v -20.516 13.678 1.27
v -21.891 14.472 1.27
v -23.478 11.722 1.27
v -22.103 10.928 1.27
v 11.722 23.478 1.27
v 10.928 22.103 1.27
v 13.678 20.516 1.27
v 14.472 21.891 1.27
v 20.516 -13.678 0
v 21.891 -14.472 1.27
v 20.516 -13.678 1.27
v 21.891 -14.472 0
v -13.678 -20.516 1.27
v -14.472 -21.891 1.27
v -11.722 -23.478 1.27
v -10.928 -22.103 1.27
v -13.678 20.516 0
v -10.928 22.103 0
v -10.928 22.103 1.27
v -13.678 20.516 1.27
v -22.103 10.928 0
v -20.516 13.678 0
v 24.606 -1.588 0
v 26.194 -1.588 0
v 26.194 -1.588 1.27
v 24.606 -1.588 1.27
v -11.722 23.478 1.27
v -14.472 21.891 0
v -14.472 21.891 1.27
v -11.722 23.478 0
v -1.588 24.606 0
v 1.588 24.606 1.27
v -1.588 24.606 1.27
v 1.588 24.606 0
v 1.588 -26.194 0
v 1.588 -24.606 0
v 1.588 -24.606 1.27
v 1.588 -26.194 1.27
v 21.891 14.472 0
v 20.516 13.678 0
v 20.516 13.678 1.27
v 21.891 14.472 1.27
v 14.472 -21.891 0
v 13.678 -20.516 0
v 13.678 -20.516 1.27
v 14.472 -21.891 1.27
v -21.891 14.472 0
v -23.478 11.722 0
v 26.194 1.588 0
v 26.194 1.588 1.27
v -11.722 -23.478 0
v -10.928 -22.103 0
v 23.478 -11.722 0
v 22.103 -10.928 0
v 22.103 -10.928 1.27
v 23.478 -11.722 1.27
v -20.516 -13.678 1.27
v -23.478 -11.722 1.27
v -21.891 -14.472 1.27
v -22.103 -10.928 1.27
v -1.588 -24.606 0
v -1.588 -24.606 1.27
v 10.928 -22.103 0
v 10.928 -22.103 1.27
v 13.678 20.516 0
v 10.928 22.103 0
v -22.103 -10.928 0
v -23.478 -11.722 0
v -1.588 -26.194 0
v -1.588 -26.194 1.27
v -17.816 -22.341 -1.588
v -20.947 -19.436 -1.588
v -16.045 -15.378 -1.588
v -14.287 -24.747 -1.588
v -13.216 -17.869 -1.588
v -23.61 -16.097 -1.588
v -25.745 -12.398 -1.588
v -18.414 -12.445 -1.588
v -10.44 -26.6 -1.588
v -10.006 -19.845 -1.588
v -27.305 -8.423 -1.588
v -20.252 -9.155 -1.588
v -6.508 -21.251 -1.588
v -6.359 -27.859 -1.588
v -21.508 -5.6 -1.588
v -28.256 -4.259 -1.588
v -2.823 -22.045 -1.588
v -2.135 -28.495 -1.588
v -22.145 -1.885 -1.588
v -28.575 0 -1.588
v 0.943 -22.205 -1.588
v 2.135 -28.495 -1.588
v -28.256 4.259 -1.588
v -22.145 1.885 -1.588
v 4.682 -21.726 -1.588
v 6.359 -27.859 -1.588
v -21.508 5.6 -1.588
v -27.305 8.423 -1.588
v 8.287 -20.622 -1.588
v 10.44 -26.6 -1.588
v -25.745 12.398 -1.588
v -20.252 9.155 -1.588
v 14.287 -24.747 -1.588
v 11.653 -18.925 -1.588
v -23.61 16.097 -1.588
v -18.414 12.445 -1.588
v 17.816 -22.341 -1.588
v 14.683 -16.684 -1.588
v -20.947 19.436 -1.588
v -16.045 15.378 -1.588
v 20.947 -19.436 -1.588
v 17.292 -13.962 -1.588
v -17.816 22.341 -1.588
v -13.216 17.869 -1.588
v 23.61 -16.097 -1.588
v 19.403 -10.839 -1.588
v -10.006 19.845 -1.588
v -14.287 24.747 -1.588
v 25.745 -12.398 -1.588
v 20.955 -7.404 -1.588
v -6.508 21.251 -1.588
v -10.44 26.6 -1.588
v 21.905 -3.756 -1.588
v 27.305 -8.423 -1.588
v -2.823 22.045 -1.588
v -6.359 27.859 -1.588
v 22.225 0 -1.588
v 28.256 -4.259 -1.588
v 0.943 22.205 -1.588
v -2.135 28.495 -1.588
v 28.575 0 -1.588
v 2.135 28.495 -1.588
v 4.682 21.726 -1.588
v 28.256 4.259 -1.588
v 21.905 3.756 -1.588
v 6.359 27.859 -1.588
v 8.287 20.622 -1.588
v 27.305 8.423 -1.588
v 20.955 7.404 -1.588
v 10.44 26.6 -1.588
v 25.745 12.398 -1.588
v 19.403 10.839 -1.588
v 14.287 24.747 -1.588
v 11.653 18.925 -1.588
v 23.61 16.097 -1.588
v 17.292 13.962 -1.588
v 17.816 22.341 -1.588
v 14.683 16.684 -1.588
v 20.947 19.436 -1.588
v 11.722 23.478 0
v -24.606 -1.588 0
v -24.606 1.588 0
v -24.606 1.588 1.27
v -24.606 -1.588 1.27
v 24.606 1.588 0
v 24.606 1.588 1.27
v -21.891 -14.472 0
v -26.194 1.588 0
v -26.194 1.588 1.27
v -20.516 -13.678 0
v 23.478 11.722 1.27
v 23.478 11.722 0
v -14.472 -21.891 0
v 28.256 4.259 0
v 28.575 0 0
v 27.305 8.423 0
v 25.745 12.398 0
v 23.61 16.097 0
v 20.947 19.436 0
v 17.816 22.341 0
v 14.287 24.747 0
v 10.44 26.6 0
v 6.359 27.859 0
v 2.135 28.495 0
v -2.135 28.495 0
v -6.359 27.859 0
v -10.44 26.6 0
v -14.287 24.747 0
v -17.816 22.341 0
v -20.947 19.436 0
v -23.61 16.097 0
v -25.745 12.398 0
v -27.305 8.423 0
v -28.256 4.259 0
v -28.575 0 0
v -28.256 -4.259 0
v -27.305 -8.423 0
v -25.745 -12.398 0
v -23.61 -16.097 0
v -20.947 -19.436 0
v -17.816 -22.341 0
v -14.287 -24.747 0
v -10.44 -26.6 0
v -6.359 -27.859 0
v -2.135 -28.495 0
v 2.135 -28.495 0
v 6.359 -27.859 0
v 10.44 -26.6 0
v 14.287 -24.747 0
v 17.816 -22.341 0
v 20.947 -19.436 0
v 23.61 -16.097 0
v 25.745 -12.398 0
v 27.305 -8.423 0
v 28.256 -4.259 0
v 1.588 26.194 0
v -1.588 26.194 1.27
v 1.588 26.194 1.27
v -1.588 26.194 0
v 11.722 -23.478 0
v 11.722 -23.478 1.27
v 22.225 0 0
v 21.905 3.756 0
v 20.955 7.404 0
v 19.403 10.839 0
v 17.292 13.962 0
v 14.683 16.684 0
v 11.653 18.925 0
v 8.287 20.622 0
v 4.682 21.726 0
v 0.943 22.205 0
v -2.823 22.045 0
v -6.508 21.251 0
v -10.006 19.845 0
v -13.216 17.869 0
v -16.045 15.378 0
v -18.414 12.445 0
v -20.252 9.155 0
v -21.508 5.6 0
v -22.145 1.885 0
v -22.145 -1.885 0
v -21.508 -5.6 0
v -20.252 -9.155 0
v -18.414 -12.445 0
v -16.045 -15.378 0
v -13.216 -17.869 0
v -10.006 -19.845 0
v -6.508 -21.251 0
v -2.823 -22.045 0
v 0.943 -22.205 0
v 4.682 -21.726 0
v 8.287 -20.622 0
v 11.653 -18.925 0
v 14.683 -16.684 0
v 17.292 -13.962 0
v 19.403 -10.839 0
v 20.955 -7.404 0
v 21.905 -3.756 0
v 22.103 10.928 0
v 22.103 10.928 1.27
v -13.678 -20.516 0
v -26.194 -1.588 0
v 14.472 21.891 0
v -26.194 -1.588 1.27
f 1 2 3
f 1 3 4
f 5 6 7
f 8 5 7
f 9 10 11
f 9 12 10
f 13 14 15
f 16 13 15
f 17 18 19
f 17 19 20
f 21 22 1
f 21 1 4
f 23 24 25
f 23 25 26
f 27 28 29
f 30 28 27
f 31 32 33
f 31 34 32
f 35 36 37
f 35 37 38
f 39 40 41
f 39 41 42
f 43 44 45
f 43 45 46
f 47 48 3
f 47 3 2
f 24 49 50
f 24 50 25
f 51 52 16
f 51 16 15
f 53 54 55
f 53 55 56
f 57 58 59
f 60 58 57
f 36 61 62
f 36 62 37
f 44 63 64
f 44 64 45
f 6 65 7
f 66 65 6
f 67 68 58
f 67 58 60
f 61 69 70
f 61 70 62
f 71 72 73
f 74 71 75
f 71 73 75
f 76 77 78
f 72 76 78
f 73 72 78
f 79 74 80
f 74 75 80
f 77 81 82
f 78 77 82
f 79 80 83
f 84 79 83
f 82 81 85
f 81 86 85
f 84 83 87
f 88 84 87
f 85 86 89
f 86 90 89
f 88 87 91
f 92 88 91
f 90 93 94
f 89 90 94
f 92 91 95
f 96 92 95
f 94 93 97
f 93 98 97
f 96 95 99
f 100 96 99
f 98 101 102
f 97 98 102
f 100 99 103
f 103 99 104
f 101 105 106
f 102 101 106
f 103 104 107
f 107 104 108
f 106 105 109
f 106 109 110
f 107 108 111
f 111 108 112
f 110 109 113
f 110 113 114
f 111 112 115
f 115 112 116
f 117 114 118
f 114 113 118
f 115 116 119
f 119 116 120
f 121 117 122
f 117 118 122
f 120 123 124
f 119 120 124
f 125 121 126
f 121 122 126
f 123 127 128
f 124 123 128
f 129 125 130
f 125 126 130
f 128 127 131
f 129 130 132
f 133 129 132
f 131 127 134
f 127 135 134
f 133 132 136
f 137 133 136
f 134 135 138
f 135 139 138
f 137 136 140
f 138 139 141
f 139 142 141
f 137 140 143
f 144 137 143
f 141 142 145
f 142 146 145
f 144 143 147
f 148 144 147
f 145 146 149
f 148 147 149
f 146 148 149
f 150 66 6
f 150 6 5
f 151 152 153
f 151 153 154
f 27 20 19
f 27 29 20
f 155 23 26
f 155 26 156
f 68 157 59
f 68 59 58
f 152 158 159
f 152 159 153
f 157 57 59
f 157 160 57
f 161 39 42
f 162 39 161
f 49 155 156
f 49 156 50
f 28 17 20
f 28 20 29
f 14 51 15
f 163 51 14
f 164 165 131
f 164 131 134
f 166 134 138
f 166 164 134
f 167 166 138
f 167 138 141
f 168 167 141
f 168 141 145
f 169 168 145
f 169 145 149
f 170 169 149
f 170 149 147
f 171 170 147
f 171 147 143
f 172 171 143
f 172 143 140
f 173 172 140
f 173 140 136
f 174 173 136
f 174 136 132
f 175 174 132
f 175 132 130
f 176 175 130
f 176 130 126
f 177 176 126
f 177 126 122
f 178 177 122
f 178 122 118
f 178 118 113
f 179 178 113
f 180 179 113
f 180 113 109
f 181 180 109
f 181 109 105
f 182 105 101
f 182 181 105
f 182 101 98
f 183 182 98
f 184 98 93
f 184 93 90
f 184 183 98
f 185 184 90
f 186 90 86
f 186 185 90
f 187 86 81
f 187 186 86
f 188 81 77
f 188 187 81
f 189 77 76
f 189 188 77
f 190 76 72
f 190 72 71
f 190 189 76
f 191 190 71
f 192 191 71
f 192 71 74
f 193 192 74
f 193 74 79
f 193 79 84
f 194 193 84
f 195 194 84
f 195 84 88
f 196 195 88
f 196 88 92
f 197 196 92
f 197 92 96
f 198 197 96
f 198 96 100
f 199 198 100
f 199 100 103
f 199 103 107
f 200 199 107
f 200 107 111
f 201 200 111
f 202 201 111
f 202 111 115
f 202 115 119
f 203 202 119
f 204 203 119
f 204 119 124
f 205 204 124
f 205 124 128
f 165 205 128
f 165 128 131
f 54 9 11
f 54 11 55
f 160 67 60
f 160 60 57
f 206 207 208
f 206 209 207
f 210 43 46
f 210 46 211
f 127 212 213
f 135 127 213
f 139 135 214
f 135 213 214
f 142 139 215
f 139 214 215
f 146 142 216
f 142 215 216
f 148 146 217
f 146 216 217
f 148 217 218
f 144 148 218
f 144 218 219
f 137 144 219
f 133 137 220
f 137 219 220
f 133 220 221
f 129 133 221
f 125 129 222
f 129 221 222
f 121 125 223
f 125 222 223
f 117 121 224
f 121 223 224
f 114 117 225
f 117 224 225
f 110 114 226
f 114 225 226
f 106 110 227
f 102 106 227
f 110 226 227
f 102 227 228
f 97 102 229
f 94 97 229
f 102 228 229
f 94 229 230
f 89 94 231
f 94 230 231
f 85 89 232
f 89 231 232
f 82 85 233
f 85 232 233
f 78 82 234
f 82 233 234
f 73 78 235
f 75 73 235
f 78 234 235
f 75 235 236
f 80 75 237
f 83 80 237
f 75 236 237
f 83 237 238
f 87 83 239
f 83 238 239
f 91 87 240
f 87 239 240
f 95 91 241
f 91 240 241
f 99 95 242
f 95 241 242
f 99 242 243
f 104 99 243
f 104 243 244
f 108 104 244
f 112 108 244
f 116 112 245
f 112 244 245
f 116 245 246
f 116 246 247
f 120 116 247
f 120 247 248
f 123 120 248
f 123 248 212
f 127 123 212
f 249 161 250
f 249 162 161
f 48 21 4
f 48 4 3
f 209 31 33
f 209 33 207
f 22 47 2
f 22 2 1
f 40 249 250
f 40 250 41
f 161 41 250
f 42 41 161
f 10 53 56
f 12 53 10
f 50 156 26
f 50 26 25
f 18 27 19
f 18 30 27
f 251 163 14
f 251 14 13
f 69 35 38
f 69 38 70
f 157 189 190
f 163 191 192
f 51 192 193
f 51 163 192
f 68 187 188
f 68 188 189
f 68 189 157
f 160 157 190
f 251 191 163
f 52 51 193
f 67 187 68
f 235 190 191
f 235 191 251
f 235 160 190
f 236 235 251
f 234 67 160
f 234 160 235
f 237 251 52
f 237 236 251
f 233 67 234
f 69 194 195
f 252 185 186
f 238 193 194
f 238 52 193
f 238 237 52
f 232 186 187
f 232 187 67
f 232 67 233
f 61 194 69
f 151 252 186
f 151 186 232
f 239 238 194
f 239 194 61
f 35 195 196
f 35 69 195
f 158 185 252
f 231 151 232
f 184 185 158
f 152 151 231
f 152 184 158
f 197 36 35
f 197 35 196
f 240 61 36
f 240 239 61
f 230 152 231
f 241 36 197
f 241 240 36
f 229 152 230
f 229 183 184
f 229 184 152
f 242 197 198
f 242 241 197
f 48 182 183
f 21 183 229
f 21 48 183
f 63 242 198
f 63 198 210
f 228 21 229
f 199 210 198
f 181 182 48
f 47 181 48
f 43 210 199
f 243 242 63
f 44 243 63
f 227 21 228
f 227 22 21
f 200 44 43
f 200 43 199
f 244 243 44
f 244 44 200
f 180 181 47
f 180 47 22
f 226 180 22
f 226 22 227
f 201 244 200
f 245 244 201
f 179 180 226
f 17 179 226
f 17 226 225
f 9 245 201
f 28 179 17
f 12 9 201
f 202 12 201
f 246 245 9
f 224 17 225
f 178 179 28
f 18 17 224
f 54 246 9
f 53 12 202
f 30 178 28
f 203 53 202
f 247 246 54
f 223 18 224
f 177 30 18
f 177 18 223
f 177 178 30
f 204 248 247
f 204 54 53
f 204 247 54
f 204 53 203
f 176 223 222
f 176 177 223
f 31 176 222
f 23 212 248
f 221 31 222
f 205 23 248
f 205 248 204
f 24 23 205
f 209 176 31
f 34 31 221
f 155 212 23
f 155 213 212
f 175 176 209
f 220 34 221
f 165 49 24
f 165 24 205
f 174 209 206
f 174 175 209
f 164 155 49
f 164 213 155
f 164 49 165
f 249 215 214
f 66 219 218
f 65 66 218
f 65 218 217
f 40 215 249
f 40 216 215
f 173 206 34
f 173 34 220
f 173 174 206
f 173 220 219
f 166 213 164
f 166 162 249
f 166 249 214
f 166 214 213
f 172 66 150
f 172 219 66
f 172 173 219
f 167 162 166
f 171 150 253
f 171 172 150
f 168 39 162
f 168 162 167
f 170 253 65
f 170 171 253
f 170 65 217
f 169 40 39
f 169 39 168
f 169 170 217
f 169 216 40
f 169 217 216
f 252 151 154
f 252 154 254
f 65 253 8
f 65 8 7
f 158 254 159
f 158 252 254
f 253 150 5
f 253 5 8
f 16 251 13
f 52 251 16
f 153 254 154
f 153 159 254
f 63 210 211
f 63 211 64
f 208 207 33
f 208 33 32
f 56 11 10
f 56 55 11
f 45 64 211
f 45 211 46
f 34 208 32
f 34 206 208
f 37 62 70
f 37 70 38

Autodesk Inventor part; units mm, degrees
ref_plane "YZ Plane" through (0, 0, 0) normal (1, 0, 0) x (0, 1, 0)
ref_plane "XZ Plane" through (0, 0, 0) normal (0, 1, 0) x (-1, 0, 0)
ref_plane "XY Plane" through (0, 0, 0) normal (0, 0, 1) x (1, 0, 0)
sketch "Sketch1" plane through (0, 0, 0) normal (0, 0, 1) x (1, 0, 0)
  circle A0 centre (0, 0) radius 22.225
  circle A1 centre (0, 0) radius 28.575
  line L0 (0, 0) -> (-22.225, 0) construction
  line L1 (-26.1937, 1.5875) -> (-24.6062, 1.5875)
  line L2 (-24.6062, 1.5875) -> (-24.6062, -1.5875)
  line L3 (-24.6062, -1.5875) -> (-26.1937, -1.5875)
  line L4 (-26.1937, -1.5875) -> (-26.1937, 1.5875)
  line L5 (-22.225, 0) -> (-28.575, 0) construction
  line L6 (-25.4, 1.5875) -> (-25.4, -1.5875) construction
  line L7 (-23.4782, -11.7221) -> (-22.1034, -10.9283)
  line L8 (-22.1034, -10.9283) -> (-20.5159, -13.6779)
  line L9 (-20.5159, -13.6779) -> (-21.8907, -14.4717)
  line L10 (-21.8907, -14.4717) -> (-23.4782, -11.7221)
  line L11 (-22.7908, -11.3252) -> (-21.2033, -14.0748) construction
  line L12 (-14.4717, -21.8907) -> (-13.6779, -20.5159)
  line L13 (-13.6779, -20.5159) -> (-10.9283, -22.1034)
  line L14 (-10.9283, -22.1034) -> (-11.7221, -23.4782)
  line L15 (-11.7221, -23.4782) -> (-14.4717, -21.8907)
  line L16 (-14.0748, -21.2033) -> (-11.3252, -22.7908) construction
  line L17 (-1.5875, -26.1938) -> (-1.5875, -24.6063)
  line L18 (-1.5875, -24.6063) -> (1.5875, -24.6063)
  line L19 (1.5875, -24.6063) -> (1.5875, -26.1938)
  line L20 (1.5875, -26.1938) -> (-1.5875, -26.1938)
  line L21 (-1.5875, -25.4) -> (1.5875, -25.4) construction
  line L22 (11.7221, -23.4782) -> (10.9283, -22.1034)
  line L23 (10.9283, -22.1034) -> (13.6779, -20.5159)
  line L24 (13.6779, -20.5159) -> (14.4717, -21.8907)
  line L25 (14.4717, -21.8907) -> (11.7221, -23.4782)
  line L26 (11.3252, -22.7908) -> (14.0748, -21.2033) construction
  line L27 (21.8907, -14.4717) -> (20.5159, -13.6779)
  line L28 (20.5159, -13.6779) -> (22.1034, -10.9283)
  line L29 (22.1034, -10.9283) -> (23.4782, -11.7221)
  line L30 (23.4782, -11.7221) -> (21.8907, -14.4717)
  line L31 (21.2033, -14.0748) -> (22.7908, -11.3252) construction
  line L32 (26.1938, -1.5875) -> (24.6063, -1.5875)
  line L33 (24.6063, -1.5875) -> (24.6063, 1.5875)
  line L34 (24.6063, 1.5875) -> (26.1938, 1.5875)
  line L35 (26.1938, 1.5875) -> (26.1938, -1.5875)
  line L36 (25.4, -1.5875) -> (25.4, 1.5875) construction
  line L37 (23.4782, 11.7221) -> (22.1034, 10.9283)
  line L38 (22.1034, 10.9283) -> (20.5159, 13.6779)
  line L39 (20.5159, 13.6779) -> (21.8907, 14.4717)
  line L40 (21.8907, 14.4717) -> (23.4782, 11.7221)
  line L41 (22.7908, 11.3252) -> (21.2033, 14.0748) construction
  line L42 (14.4717, 21.8907) -> (13.6779, 20.5159)
  line L43 (13.6779, 20.5159) -> (10.9283, 22.1034)
  line L44 (10.9283, 22.1034) -> (11.7221, 23.4782)
  line L45 (11.7221, 23.4782) -> (14.4717, 21.8907)
  line L46 (14.0748, 21.2033) -> (11.3252, 22.7908) construction
  line L47 (1.5875, 26.1937) -> (1.5875, 24.6063)
  line L48 (1.5875, 24.6063) -> (-1.5875, 24.6063)
  line L49 (-1.5875, 24.6063) -> (-1.5875, 26.1938)
  line L50 (-1.5875, 26.1938) -> (1.5875, 26.1937)
  line L51 (1.5875, 25.4) -> (-1.5875, 25.4) construction
  line L52 (-11.7221, 23.4782) -> (-10.9283, 22.1034)
  line L53 (-10.9283, 22.1034) -> (-13.6779, 20.5159)
  line L54 (-13.6779, 20.5159) -> (-14.4717, 21.8907)
  line L55 (-14.4717, 21.8907) -> (-11.7221, 23.4782)
  line L56 (-11.3252, 22.7908) -> (-14.0748, 21.2033) construction
  line L57 (-21.8907, 14.4717) -> (-20.5159, 13.6779)
  line L58 (-20.5159, 13.6779) -> (-22.1034, 10.9283)
  line L59 (-22.1034, 10.9283) -> (-23.4782, 11.7221)
  line L60 (-23.4782, 11.7221) -> (-21.8907, 14.4717)
  line L61 (-21.2033, 14.0748) -> (-22.7908, 11.3252) construction
  point P0 (-26.1937, 0)
  point P1 (-25.4, 0)
  point P2 (-22.6845, -13.0969)
  point P3 (-21.997, -12.7)
  point P4 (-13.0969, -22.6845)
  point P5 (-12.7, -21.997)
  point P6 (0, -26.1937)
  point P7 (0, -25.4)
  point P8 (13.0969, -22.6845)
  point P9 (12.7, -21.997)
  point P10 (22.6845, -13.0969)
  point P11 (21.997, -12.7)
  point P12 (26.1937, 0)
  point P13 (25.4, 0)
  point P14 (22.6845, 13.0969)
  point P15 (21.997, 12.7)
  point P16 (13.0969, 22.6845)
  point P17 (12.7, 21.997)
  point P18 (0, 26.1937)
  point P19 (0, 25.4)
  point P20 (-13.0969, 22.6845)
  point P21 (-12.7, 21.997)
  point P22 (-22.6845, 13.0969)
  point P23 (-21.997, 12.7)
  dimension "d0" = 44.45
  dimension "d1" = 57.15
  dimension "d2" = 3.175
  dimension "d3" = 1.5875
  dimension "d6" = 360
extrude "Extrusion1" add sketch "Sketch1" against normal blind 1.5875 contours A1 | L1 L2 L3 L4 | L7 L8 L9 L10 | L12 L13 L14 L15 | L17 L18 L19 L20 | L22 L23 L24 L25 | L27 L28 L29 L30 | L32 L33 L34 L35 | L37 L38 L39 L40 | L42 L43 L44 L45 | L47 L48 L49 L50 | L52 L53 L54 L55 | L57 L58 L59 L60
extrude "Extrusion2" add sketch "Sketch1" along normal blind 1.27 contours L1 L2 L3 L4 | L7 L8 L9 L10 | L12 L13 L14 L15 | L17 L18 L19 L20 | L22 L23 L24 L25 | L27 L28 L29 L30 | L32 L33 L34 L35 | L37 L38 L39 L40 | L42 L43 L44 L45 | L47 L48 L49 L50 | L52 L53 L54 L55 | L57 L58 L59 L60
properties part number "LED Ring"
